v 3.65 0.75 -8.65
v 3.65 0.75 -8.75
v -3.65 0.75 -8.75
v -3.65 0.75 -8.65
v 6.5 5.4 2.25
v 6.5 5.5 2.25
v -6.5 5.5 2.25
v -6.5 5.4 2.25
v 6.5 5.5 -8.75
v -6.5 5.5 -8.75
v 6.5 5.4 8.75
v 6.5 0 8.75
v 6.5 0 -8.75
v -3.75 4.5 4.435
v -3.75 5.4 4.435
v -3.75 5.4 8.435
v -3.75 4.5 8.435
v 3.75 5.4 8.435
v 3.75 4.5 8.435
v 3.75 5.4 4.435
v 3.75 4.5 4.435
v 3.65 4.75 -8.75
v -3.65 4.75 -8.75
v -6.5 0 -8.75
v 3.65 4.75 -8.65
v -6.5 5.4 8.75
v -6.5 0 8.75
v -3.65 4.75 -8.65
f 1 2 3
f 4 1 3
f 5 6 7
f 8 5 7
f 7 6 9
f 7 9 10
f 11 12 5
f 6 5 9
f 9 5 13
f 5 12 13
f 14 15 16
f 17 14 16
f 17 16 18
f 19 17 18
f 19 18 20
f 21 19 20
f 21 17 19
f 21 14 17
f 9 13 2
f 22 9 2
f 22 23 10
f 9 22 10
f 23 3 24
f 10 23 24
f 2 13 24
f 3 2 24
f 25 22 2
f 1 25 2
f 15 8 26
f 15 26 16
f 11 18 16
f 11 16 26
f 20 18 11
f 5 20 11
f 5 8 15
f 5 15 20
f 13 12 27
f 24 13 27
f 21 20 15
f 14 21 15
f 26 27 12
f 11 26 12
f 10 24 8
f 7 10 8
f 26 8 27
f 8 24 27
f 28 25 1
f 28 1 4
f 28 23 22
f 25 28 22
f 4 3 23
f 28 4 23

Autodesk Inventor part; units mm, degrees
ref_plane "YZ Plane" through (0, 0, 0) normal (1, 0, 0) x (0, 1, 0)
ref_plane "XZ Plane" through (0, 0, 0) normal (0, 1, 0) x (-1, 0, 0)
ref_plane "XY Plane" through (0, 0, 0) normal (0, 0, 1) x (1, 0, 0)
sketch "Skizze1" plane through (0, 0, 0) normal (0, 1, 0) x (-1, 0, 0)
  line L0 (-6.5, -8.75) -> (6.5, -8.75)
  line L1 (6.5, -8.75) -> (6.5, 8.75)
  line L2 (6.5, 8.75) -> (-6.5, 8.75)
  line L3 (-6.5, 8.75) -> (-6.5, -8.75)
  line L4 (-6.5, -8.75) -> (6.5, 8.75) construction
  line L5 (6.5, -8.75) -> (-6.5, 8.75) construction
  point P0 (0, 0)
  dimension "d0" = 13
  dimension "d1" = 17.5
extrude "Extrusion1" add sketch "Skizze1" along normal blind 5.5
sketch "Skizze2" plane through (0, 5.5, 0) normal (0, 1, 0) x (1, 0, 0)
  line L0 (-6.5, 8.75) -> (-6.5, -8.75) projected
  line L1 (-6.5, -8.75) -> (6.5, -8.75) projected
  line L2 (6.5, -8.75) -> (6.5, 8.75) projected
  line L3 (6.5, 8.75) -> (-6.5, 8.75) projected
  line L4 (3.75, -4.4349) -> (-3.75, -4.4349)
  line L5 (-3.75, -4.4349) -> (-3.75, -8.4349)
  line L6 (-3.75, -8.4349) -> (3.75, -8.4349)
  line L7 (3.75, -8.4349) -> (3.75, -4.4349)
  line L8 (3.75, -4.4349) -> (-3.75, -8.4349) construction
  line L9 (-3.75, -4.4349) -> (3.75, -8.4349) construction
  point P0 (0, 0)
  point P1 (0, -6.4349)
  dimension "d4" = 7.5
  dimension "d5" = 4
extrude "Extrusion2" cut sketch "Skizze2" against normal blind 1 contours L7 L6 L5 L4
sketch "Skizze3" plane through (0, 5.5, 0) normal (0, 1, 0) x (1, 0, 0)
  line L0 (-6.5, 8.75) -> (-6.5, -8.75) projected
  line L1 (3.75, -8.4349) -> (-3.75, -8.4349) projected
  line L2 (-3.75, -8.4349) -> (-3.75, -4.4349) projected
  line L3 (-3.75, -4.4349) -> (3.75, -4.4349) projected
  line L4 (3.75, -4.4349) -> (3.75, -8.4349) projected
  line L5 (-6.5, 8.75) -> (-6.5, -8.75) projected
  line L6 (-6.5, -8.75) -> (6.5, -8.75) projected
  line L7 (6.5, -8.75) -> (6.5, 8.75) projected
  line L8 (6.5, 8.75) -> (-6.5, 8.75) projected
  line L9 (6.5, -8.75) -> (6.5, 8.75) projected
  line L10 (-6.5, -8.75) -> (6.5, -8.75)
  line L11 (6.5, -8.75) -> (6.5, -2.25)
  line L12 (6.5, -2.25) -> (-6.5, -2.25)
  line L13 (-6.5, -2.25) -> (-6.5, -8.75)
  point P0 (0, 0)
  dimension "d8" = 6.5
extrude "Extrusion3" cut sketch "Skizze3" against normal blind 0.1 contours L12 L7 L6 L0
sketch "Skizze4" plane through (6.5, 0, -8.75) normal (0, 0, -1) x (-1, 0, 0)
  line L0 (0, 0) -> (13, 0) projected
  line L1 (13, 0) -> (13, 5.5) projected
  line L2 (0, 5.5) -> (13, 5.5) projected
  line L3 (0, 0) -> (0, 5.5) projected
  line L4 (10.15, 4.75) -> (2.85, 4.75)
  line L5 (2.85, 4.75) -> (2.85, 0.75)
  line L6 (2.85, 0.75) -> (10.15, 0.75)
  line L7 (10.15, 0.75) -> (10.15, 4.75)
  line L8 (10.15, 4.75) -> (2.85, 0.75) construction
  line L9 (2.85, 4.75) -> (10.15, 0.75) construction
  point P0 (6.5, 0)
  point P1 (6.5, 2.75)
  dimension "d11" = 7.3
  dimension "d12" = 4
extrude "Extrusion4" cut sketch "Skizze4" against normal blind 0.1 contours L7 L6 L5 L4
properties part number "00_HuaweiP30_Telelens"
